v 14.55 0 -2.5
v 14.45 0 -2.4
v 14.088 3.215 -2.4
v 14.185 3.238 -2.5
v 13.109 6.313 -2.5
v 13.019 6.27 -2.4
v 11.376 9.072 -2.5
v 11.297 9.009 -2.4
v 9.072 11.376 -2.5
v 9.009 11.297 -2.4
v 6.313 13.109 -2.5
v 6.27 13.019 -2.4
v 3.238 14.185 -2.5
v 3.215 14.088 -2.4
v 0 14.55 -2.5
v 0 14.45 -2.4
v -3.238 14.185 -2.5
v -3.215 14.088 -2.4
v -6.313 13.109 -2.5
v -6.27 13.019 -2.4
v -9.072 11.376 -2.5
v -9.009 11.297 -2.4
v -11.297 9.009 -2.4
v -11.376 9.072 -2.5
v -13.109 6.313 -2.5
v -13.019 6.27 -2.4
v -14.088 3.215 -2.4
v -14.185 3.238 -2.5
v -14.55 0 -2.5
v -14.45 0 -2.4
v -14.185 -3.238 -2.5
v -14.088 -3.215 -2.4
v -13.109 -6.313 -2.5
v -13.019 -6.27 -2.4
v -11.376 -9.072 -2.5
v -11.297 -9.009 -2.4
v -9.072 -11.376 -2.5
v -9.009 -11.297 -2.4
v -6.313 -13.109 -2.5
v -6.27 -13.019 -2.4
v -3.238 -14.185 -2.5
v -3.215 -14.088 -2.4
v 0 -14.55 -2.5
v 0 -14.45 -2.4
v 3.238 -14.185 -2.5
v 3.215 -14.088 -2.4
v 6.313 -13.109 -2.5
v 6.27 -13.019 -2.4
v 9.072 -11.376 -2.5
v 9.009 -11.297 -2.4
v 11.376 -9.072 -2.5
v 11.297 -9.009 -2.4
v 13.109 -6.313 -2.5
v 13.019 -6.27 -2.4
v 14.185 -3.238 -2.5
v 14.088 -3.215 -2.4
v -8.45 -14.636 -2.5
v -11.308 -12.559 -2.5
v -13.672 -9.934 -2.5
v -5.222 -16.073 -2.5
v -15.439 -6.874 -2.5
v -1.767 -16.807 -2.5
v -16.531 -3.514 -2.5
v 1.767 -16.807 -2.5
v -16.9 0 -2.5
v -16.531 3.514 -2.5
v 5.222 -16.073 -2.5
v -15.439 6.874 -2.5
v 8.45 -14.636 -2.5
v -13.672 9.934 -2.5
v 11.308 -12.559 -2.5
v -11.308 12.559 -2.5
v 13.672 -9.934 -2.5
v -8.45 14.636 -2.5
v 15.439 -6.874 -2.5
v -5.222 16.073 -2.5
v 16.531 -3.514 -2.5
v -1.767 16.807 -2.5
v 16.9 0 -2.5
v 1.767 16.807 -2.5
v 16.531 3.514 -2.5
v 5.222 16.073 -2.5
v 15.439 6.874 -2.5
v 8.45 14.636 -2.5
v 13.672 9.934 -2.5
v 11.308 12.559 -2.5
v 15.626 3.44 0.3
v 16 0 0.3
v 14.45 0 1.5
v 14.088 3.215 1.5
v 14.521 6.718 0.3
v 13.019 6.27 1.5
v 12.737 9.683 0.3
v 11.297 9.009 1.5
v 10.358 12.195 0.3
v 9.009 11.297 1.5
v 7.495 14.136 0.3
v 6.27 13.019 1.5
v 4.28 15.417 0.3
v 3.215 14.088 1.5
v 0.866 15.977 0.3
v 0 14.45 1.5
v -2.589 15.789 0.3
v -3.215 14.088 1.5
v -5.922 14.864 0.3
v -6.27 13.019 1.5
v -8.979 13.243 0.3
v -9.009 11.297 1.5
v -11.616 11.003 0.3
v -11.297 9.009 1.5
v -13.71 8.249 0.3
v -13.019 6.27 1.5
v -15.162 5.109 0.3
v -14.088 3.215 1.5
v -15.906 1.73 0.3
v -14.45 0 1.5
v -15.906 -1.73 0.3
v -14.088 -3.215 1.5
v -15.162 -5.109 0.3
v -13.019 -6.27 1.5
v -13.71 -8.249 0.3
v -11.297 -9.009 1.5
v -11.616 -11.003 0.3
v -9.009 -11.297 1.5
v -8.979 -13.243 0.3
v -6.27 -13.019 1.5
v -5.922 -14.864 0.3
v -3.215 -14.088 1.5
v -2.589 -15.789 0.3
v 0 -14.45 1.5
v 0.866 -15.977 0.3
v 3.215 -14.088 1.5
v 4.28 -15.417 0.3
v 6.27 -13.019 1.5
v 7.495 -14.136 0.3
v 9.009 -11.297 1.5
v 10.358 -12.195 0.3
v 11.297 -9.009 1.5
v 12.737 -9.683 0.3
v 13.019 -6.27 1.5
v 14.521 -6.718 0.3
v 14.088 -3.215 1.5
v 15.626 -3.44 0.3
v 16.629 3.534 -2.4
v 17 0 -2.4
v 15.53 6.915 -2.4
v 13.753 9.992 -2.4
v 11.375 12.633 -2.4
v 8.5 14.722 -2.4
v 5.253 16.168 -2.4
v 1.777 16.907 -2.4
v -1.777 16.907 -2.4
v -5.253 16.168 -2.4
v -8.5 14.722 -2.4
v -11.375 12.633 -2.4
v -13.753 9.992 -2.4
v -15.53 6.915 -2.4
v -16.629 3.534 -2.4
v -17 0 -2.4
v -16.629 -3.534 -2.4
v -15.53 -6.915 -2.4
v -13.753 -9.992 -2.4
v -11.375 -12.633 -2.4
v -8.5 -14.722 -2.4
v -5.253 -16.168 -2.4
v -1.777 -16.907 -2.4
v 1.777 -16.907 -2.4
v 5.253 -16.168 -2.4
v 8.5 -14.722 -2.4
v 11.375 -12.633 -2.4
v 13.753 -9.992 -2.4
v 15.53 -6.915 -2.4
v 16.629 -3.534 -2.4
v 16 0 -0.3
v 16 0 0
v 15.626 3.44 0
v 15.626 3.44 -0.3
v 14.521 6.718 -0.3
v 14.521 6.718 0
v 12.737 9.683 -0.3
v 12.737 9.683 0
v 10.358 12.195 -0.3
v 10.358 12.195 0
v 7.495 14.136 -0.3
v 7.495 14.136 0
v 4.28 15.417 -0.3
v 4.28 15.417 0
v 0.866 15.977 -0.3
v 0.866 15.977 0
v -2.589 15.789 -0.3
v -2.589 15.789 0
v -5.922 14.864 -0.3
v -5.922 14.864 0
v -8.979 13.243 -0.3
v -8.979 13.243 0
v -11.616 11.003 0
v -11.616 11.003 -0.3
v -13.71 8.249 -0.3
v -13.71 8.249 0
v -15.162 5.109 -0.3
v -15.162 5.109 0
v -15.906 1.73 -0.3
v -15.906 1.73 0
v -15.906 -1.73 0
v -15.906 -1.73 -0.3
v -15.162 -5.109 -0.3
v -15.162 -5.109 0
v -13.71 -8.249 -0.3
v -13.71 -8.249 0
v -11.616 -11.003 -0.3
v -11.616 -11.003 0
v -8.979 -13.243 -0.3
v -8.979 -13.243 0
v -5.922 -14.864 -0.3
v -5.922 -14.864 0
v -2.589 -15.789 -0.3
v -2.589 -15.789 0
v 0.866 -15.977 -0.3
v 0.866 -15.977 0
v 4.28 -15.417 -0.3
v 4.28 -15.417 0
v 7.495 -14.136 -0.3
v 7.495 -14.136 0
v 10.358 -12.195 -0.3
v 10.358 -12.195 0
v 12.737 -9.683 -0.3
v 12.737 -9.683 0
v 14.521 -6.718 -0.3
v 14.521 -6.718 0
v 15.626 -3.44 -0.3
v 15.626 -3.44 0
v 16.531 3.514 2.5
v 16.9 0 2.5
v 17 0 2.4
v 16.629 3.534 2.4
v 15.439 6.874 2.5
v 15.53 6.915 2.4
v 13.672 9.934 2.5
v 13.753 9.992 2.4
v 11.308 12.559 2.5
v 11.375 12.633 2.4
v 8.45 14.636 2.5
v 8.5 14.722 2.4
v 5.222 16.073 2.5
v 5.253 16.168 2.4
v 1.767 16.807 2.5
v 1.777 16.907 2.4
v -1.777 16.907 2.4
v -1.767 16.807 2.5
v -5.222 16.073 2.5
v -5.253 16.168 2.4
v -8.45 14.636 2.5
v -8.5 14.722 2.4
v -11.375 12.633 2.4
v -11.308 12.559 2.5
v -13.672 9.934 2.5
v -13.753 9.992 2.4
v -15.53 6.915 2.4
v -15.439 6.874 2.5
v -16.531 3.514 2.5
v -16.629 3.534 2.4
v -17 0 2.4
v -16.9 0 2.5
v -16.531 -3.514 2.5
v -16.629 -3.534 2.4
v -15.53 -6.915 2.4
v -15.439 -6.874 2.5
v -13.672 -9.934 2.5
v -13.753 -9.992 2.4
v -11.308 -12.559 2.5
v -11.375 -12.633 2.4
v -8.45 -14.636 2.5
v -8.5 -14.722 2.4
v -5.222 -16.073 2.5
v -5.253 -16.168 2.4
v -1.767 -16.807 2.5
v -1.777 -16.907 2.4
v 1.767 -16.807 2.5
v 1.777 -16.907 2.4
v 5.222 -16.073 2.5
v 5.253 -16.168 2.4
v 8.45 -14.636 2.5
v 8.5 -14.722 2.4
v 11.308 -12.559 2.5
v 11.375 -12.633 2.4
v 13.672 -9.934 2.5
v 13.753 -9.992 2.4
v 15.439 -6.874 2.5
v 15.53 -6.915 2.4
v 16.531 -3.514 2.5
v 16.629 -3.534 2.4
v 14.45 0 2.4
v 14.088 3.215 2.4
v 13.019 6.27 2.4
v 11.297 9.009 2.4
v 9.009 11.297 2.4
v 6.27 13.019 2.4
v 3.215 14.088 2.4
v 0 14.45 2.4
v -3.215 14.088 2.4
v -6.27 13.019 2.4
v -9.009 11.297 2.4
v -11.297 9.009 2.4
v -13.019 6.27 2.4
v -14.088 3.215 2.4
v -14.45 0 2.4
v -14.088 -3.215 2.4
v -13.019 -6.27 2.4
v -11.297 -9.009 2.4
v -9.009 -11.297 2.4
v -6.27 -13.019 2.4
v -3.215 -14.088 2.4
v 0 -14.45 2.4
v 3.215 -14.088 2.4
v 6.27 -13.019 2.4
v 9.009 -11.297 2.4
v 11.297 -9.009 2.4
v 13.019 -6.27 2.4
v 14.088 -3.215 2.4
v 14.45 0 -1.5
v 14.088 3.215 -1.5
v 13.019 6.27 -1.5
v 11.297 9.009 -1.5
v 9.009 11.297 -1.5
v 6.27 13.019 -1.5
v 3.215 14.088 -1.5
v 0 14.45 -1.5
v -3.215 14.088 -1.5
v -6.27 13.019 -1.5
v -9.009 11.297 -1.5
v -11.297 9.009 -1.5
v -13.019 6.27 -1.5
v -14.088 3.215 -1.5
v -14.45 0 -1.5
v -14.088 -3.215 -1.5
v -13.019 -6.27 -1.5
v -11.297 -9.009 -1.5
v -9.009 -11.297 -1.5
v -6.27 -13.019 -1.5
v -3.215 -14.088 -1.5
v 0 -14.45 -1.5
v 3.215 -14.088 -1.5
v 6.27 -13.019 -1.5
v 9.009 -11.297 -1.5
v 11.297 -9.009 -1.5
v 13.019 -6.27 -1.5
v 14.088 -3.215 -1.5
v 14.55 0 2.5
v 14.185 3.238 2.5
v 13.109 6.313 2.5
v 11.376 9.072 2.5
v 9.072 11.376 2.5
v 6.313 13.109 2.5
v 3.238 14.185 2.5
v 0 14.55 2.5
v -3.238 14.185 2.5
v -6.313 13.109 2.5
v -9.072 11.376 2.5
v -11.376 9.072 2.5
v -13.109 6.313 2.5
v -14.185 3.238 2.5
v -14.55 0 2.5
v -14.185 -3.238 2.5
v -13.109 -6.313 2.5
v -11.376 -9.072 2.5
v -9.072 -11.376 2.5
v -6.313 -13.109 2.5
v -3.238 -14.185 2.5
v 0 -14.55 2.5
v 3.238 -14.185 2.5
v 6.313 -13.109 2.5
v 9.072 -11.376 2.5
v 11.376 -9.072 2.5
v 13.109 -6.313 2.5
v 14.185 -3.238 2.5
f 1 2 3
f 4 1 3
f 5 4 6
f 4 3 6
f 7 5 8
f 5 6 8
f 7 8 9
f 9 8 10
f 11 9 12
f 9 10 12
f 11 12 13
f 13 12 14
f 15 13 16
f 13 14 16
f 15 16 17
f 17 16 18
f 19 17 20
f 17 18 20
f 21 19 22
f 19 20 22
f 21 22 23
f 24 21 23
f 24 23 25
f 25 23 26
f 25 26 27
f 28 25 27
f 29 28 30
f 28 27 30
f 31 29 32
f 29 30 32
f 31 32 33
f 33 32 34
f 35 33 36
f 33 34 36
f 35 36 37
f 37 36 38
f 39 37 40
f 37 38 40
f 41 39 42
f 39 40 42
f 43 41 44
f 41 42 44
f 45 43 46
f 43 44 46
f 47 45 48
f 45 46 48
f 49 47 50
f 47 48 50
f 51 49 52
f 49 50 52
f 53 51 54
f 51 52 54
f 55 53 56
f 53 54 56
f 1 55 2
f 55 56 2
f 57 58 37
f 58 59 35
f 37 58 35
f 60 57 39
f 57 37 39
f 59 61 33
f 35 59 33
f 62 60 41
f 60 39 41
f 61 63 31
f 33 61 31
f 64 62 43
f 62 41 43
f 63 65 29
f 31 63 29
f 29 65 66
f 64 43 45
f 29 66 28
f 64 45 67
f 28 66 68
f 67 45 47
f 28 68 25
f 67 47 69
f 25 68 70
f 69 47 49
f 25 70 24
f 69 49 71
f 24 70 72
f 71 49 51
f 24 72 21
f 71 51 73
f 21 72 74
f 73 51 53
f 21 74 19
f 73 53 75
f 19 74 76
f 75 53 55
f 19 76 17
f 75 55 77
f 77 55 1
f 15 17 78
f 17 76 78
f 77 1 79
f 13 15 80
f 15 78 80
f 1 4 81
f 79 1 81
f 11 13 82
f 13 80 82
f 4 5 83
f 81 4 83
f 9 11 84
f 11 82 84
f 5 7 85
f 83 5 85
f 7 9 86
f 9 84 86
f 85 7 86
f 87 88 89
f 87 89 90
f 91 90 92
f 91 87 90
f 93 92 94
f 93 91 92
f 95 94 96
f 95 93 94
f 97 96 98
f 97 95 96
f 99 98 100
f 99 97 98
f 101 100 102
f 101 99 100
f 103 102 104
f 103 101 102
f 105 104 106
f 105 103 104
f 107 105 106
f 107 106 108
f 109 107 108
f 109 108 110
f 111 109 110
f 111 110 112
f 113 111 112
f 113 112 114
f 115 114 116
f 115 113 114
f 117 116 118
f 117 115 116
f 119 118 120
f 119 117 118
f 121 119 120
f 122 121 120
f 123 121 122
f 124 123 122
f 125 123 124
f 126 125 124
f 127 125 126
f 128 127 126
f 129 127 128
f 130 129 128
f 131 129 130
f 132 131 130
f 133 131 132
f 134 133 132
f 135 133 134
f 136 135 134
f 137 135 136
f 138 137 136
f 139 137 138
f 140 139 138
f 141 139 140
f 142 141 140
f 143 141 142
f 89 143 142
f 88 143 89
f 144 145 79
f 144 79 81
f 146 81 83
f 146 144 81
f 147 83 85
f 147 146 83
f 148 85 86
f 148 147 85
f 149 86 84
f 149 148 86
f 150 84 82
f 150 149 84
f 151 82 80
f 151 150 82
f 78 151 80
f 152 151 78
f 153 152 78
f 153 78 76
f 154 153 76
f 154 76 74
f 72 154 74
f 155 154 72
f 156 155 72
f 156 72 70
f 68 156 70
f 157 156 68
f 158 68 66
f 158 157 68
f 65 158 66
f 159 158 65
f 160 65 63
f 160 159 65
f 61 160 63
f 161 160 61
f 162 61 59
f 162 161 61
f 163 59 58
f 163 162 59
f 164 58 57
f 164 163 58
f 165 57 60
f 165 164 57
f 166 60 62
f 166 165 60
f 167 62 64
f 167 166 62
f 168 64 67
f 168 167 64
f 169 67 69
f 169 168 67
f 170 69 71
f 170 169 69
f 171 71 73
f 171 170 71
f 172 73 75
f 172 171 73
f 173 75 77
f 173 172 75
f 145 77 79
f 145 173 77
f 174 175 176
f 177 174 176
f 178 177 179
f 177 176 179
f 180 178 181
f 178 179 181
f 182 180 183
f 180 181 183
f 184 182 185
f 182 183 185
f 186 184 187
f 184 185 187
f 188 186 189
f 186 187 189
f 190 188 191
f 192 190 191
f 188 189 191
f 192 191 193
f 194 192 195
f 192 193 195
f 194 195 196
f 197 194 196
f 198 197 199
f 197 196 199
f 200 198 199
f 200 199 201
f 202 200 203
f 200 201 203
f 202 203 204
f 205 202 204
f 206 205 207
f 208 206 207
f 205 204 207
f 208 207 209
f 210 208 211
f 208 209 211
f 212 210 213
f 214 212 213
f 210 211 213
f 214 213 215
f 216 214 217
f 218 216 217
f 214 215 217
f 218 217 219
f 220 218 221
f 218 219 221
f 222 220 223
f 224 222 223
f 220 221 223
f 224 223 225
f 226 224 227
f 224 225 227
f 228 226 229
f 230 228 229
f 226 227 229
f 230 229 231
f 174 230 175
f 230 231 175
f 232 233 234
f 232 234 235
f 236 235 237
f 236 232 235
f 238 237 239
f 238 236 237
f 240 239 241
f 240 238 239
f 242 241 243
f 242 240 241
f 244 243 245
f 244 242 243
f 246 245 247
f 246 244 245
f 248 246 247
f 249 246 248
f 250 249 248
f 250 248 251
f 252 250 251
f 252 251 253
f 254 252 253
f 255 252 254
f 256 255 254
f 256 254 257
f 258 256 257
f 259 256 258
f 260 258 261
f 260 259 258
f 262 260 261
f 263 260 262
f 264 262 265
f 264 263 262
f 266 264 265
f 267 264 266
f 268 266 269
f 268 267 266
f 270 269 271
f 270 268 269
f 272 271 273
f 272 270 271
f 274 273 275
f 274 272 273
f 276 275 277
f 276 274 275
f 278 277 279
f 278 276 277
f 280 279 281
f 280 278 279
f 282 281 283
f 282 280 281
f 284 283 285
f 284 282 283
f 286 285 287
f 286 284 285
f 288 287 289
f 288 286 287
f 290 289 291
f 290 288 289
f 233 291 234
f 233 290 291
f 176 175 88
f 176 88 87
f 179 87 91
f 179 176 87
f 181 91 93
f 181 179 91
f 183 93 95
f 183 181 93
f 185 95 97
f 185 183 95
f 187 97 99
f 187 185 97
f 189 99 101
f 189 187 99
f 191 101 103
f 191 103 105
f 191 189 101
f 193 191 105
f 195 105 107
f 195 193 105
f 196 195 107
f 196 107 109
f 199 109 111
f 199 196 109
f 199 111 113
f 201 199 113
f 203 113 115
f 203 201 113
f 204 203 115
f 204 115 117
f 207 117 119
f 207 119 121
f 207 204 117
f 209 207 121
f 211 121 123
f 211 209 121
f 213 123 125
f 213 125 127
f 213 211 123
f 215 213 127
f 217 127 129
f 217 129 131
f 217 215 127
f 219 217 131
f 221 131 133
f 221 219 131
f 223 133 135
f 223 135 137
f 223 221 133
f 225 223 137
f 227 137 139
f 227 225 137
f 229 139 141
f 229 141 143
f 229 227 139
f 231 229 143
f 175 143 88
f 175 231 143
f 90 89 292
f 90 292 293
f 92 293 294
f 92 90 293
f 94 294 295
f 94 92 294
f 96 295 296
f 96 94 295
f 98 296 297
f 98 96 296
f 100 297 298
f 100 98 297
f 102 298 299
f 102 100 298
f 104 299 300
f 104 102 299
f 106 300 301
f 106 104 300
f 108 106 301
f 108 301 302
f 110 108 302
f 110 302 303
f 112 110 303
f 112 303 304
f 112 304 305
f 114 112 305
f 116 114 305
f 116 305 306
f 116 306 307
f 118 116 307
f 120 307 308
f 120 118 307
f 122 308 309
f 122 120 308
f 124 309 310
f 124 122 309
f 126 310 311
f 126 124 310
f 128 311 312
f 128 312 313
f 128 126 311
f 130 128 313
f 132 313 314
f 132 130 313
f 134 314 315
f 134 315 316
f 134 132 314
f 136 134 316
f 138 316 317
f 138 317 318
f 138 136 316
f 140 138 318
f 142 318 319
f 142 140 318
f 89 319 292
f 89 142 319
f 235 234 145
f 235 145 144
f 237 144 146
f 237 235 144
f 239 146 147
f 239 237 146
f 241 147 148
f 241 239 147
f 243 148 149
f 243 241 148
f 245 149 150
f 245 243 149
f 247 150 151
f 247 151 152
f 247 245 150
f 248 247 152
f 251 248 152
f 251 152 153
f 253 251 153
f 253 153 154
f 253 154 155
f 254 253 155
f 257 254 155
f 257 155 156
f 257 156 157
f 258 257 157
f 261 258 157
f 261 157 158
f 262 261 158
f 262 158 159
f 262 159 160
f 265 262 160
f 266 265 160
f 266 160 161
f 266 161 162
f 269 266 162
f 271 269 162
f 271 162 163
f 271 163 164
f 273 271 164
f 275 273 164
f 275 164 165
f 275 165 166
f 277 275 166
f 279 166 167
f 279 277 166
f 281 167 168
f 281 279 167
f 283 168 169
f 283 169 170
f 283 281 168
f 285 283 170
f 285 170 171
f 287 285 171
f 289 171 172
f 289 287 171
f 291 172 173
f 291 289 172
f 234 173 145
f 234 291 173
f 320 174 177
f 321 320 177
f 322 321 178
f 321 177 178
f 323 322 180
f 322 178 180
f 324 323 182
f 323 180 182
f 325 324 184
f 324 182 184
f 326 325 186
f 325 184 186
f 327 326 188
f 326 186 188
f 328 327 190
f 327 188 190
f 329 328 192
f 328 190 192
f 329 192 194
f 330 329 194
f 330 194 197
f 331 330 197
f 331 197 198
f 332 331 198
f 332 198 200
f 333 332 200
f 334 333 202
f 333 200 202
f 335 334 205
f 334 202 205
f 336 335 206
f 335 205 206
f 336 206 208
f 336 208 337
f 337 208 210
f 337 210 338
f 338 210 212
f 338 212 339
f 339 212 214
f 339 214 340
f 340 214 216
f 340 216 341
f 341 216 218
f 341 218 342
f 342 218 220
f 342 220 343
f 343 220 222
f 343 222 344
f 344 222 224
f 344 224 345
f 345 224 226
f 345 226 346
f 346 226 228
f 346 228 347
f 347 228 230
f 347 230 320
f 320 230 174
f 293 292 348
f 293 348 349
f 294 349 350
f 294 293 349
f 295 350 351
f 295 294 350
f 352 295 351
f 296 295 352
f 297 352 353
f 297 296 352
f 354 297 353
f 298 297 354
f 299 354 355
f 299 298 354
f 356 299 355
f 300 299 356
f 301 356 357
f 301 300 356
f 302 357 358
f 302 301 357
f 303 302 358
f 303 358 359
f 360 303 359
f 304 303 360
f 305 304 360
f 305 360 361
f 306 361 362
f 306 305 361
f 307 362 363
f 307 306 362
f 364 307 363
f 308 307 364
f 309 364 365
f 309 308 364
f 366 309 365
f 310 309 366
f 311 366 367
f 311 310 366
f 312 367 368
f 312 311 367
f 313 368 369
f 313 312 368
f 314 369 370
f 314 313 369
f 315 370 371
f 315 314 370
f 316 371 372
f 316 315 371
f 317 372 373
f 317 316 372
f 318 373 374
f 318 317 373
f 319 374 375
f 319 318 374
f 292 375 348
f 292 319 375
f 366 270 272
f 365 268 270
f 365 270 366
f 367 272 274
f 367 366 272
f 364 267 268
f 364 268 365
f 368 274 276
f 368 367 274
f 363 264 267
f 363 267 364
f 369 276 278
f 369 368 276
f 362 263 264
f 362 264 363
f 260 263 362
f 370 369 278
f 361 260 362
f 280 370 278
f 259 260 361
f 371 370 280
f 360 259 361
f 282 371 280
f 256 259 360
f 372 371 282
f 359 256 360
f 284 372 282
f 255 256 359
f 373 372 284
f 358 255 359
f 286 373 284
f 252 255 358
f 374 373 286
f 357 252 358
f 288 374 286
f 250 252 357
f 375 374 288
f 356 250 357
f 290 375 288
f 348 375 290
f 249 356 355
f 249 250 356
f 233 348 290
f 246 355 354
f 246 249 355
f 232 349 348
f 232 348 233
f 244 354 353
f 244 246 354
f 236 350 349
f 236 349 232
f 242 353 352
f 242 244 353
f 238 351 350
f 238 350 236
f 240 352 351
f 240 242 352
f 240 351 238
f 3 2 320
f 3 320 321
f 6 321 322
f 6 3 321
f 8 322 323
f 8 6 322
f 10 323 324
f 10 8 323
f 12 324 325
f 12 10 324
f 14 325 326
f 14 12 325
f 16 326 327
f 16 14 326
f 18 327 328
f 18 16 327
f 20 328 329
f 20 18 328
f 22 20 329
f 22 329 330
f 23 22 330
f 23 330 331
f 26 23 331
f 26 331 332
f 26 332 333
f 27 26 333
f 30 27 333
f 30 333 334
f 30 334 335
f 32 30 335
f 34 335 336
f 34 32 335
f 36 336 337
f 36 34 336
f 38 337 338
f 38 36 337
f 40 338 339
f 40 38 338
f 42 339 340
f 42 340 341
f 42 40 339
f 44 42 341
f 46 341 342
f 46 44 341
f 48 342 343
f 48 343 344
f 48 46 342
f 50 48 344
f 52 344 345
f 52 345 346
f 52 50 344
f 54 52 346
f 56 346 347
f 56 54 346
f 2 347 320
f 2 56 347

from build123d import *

# Parameters (mm, degrees)
F0_R          = 17
F0_R_2        = 16
F0_R_3        = 14.45
F1_DEPTH      = 2.5
F2_DEPTH      = 1.5
F2_DEPTH_BACK = 1.5
F3_SIZE2      = 1.19999
F3_SIZE       = 1.54999
F4_SIZE       = 0.1
F6_SIZE       = 0.1


# Not quite as in the source:
# - a fillet or chamfer is up to 0.001 mm smaller than in the source, because OpenCascade refuses the exact size


with BuildPart() as f1:
    # F0 (on Top) → F1 (new body, symmetric)
    with BuildSketch(Plane.XY):
        Circle(F0_R)
        Circle(F0_R_2, mode=Mode.SUBTRACT)
        Circle(F0_R_2)
        Circle(F0_R_3, mode=Mode.SUBTRACT)
    extrude(amount=F1_DEPTH, both=True)

    # F0 (on Top) → F2 (cut, two sides)
    with BuildSketch(Plane.XY) as f2_sk:
        Circle(F0_R_2)
        Circle(F0_R_3, mode=Mode.SUBTRACT)
    extrude(amount=F2_DEPTH, mode=Mode.SUBTRACT)
    extrude(f2_sk.sketch, amount=-F2_DEPTH_BACK, mode=Mode.SUBTRACT)

    # F3 (size 1.55 and 1.2 in the source; OpenCascade refuses exactly that, so slightly less here)
    f3_edges = [f1.edges().sort_by_distance(p)[0] for p in [
        (-16, 0, -1.5),
        (-16, 0, 1.5),
    ]]
    chamfer(f3_edges, length=F3_SIZE, length2=F3_SIZE2)

    # F4
    f4_edges = [f1.edges().sort_by_distance(p)[0] for p in [
        (-17, 0, 2.5),
        (-17, 0, -2.5),
    ]]
    chamfer(f4_edges, length=F4_SIZE)

    # F6
    f6_edges = [f1.edges().sort_by_distance(p)[0] for p in [
        (-14.45, 0, 2.5),
        (-14.45, 0, -2.5),
    ]]
    chamfer(f6_edges, length=F6_SIZE)


solid = f1.part
